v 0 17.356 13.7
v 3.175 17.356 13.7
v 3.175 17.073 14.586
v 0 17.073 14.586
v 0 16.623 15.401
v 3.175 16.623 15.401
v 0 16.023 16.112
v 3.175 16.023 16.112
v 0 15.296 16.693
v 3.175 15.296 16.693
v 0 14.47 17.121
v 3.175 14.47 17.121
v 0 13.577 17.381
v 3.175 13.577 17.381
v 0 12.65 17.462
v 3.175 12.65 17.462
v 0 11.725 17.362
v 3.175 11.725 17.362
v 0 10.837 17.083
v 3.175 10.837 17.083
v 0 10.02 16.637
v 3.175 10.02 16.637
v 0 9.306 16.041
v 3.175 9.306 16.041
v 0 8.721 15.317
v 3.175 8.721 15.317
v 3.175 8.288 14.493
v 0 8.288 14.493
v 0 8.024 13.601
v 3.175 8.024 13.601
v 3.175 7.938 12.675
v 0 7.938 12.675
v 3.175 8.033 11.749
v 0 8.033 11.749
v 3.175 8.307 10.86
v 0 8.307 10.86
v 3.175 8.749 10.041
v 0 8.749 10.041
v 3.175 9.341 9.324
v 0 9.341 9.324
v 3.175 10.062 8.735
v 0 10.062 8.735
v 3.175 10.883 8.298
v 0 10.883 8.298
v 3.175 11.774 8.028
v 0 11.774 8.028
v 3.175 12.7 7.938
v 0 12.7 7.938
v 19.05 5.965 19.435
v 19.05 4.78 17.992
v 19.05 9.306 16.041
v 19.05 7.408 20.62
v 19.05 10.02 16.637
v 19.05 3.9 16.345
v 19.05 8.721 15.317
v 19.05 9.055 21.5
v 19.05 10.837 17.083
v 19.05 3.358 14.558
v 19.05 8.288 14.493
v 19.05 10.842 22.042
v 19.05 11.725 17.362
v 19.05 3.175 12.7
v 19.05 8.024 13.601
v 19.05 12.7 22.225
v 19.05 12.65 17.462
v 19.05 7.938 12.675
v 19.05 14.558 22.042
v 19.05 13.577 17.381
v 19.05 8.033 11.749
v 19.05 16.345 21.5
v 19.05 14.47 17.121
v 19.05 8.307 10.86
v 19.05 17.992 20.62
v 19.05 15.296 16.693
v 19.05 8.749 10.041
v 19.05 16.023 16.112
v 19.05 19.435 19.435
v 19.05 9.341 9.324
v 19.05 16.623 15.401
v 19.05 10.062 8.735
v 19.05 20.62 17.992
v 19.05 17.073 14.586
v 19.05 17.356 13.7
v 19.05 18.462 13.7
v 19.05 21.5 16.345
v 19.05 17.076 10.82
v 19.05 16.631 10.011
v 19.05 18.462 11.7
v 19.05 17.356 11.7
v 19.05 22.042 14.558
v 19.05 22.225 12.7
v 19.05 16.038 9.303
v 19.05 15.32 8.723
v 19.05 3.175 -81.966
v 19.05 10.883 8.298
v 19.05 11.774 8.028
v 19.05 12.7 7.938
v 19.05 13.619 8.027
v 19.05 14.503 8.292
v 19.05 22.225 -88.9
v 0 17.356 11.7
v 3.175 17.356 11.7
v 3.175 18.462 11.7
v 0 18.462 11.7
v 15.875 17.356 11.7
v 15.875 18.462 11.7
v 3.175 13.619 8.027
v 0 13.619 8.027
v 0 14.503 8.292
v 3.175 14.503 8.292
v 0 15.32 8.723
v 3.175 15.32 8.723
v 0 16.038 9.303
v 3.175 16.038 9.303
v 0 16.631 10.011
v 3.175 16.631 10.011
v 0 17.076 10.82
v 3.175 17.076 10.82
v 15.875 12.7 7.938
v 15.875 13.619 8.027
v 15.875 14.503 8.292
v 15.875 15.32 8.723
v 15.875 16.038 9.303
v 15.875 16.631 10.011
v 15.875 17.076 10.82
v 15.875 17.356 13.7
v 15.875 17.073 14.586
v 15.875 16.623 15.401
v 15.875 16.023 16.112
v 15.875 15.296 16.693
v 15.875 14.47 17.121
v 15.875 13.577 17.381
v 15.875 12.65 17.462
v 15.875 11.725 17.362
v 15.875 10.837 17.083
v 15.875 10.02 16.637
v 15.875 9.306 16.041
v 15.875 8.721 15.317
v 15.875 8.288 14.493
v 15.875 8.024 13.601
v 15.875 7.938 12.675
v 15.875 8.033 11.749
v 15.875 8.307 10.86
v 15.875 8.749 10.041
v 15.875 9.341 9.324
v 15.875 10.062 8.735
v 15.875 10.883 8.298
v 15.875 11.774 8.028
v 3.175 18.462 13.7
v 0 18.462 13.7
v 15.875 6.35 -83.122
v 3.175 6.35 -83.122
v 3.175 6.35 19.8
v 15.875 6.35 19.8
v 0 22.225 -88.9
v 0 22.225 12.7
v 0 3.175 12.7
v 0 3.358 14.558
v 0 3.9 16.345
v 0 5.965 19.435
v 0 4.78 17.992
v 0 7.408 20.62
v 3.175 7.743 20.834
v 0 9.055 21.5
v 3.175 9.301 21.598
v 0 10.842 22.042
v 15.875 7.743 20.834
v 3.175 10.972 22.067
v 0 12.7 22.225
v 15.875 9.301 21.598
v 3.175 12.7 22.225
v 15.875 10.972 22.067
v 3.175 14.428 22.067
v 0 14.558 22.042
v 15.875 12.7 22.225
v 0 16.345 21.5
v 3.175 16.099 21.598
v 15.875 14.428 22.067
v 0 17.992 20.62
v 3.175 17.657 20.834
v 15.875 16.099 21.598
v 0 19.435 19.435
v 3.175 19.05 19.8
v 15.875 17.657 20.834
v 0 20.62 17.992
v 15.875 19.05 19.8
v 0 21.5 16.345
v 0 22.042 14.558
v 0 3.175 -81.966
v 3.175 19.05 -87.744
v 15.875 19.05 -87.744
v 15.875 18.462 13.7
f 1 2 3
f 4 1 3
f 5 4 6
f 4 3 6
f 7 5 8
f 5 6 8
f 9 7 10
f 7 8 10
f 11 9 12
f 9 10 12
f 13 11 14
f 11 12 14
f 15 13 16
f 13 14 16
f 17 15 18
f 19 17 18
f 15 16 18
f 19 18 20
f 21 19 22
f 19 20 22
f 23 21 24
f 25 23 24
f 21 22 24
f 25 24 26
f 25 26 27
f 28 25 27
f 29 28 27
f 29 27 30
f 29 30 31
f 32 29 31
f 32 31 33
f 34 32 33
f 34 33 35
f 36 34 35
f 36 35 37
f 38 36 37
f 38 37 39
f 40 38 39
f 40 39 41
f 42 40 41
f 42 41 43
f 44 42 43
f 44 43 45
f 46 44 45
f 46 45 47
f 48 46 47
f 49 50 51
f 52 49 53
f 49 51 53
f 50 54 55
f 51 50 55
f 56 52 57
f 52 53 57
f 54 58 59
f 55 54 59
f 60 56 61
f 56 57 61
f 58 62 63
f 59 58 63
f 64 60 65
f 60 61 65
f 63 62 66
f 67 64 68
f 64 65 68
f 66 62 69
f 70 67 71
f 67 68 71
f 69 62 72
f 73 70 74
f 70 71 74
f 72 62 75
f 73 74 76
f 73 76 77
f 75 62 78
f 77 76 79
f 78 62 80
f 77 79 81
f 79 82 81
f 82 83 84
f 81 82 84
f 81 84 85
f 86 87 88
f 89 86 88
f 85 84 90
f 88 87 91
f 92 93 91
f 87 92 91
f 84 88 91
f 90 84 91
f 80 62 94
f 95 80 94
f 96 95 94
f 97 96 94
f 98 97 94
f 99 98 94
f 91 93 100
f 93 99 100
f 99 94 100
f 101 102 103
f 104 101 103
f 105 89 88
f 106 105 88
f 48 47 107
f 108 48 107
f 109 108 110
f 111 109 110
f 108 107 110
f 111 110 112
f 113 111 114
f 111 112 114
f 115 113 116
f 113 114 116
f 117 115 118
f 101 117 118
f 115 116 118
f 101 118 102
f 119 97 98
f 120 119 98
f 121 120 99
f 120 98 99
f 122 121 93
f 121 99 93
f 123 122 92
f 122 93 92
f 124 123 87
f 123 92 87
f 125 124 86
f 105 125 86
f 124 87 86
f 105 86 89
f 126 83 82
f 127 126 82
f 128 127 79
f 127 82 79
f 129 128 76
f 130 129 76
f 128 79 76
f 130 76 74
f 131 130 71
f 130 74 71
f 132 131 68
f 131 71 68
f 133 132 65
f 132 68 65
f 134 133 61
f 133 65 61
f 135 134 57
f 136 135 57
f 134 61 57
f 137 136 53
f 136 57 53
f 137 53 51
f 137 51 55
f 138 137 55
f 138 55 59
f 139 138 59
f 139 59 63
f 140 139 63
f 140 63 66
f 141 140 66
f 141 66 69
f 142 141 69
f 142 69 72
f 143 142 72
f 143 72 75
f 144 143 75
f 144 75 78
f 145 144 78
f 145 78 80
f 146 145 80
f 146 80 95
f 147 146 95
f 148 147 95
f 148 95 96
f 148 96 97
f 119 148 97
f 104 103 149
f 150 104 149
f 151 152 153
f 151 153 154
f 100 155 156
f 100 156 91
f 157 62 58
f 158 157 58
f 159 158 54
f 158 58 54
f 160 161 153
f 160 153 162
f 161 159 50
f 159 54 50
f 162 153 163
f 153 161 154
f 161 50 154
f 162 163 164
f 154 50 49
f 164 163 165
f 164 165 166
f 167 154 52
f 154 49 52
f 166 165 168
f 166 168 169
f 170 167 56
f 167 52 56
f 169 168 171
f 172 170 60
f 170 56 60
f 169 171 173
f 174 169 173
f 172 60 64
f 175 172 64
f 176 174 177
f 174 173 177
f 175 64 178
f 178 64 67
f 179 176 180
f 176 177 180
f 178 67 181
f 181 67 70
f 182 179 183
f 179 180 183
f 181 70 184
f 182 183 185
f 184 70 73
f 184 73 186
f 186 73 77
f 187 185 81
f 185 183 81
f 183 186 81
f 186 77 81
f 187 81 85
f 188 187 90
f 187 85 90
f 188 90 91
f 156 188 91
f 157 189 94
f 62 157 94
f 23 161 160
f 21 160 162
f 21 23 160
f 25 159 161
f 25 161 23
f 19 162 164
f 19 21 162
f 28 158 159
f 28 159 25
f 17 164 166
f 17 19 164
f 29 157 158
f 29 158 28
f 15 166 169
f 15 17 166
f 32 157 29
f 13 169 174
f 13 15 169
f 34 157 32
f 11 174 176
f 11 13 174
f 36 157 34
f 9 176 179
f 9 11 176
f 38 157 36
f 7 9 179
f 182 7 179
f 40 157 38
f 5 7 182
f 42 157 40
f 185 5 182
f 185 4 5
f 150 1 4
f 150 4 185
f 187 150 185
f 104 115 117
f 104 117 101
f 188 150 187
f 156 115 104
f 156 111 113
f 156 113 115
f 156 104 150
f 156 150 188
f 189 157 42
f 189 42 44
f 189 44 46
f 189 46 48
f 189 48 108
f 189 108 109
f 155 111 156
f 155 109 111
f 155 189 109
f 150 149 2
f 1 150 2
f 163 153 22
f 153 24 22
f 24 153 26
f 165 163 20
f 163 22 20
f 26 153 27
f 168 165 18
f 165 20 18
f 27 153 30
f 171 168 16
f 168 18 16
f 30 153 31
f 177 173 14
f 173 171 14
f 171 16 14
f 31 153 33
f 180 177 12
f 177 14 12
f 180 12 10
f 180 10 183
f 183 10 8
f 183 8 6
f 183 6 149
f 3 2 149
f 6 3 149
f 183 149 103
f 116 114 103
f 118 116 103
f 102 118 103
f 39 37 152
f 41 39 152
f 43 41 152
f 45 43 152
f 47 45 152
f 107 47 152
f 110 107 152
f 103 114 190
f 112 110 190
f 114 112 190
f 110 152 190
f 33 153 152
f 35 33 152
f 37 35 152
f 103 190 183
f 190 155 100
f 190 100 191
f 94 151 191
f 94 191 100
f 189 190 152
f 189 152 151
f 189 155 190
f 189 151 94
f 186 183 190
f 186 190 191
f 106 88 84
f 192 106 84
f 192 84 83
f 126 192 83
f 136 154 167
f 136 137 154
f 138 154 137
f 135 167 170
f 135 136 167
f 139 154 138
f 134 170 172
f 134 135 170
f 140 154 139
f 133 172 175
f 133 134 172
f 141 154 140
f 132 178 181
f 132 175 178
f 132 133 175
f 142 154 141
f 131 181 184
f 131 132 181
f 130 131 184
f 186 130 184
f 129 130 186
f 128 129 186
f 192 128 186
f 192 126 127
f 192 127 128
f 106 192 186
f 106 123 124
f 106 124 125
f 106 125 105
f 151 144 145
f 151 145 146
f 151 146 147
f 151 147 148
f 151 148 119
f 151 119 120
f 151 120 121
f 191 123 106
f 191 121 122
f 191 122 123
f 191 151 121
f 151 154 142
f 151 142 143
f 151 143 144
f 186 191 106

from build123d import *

# Parameters (mm, degrees)
BOSS_EXTRUDE1_DEPTH = 19.05
SKETCH2_W           = 12.7
SKETCH2_H           = 12.7
CUT_EXTRUDE3_DEPTH  = 106.732743864
SKETCH3_W           = 19.05
SKETCH3_H           = 19.05
SKETCH3_W_2         = 12.7
SKETCH3_H_2         = 12.7
BOSS_EXTRUDE2_DEPTH = 12.7
CUT_EXTRUDE5_DEPTH  = 19.05


with BuildPart() as part:
    # Sketch1 → Boss-Extrude1 (new body)
    with BuildSketch(Plane(origin=(0, 0, 0), x_dir=(0, 0, -1), z_dir=(1, 0, 0))):
        Polygon((-12.7, 22.225), (81.966367037, 22.225), (88.9, 22.225), (81.966367037, 3.175), (-12.7, 3.175), align=None)
    extrude(amount=BOSS_EXTRUDE1_DEPTH)

    # Sketch2 → Cut-Extrude3 (cut, through all)
    with BuildSketch(Plane.XY.offset(12.7)):
        with Locations((9.525, 12.7)):
            Rectangle(SKETCH2_W, SKETCH2_H)
    extrude(amount=-CUT_EXTRUDE3_DEPTH, mode=Mode.SUBTRACT)

    # Sketch3 → Boss-Extrude2 (add)
    with BuildSketch(Plane.XY.offset(12.7)):
        with Locations((9.525, 12.7)):
            Rectangle(SKETCH3_W, SKETCH3_H)
        with Locations((9.525, 12.7)):
            Rectangle(SKETCH3_W_2, SKETCH3_H_2, mode=Mode.SUBTRACT)
    extrude(amount=BOSS_EXTRUDE2_DEPTH)

    # Sketch4 → Cut-Extrude5 (cut)
    with BuildSketch(Plane(origin=(19.05, 0, 0), x_dir=(0, 0, -1), z_dir=(1, 0, 0))):
        with BuildLine():
            Line((-11.7, 17.356329697), (-11.7, 16.4625))
            Line((-11.7, 16.4625), (-13.7, 16.4625))
            Line((-13.7, 16.4625), (-13.7, 17.356329697))
            ThreePointArc((-13.7, 17.356329697), (-15.693234559, 8.995684527), (-7.9375, 12.7))
            ThreePointArc((-7.9375, 12.7), (-8.995684527, 15.693234559), (-11.7, 17.356329697))
        make_face()
        with BuildLine():
            Line((-13.7, 16.4625), (-11.7, 16.4625))
            Line((-11.7, 16.4625), (-11.7, 17.356329697))
            ThreePointArc((-11.7, 17.356329697), (-12.7, 17.4625), (-13.7, 17.356329697))
            Line((-13.7, 17.356329697), (-13.7, 16.4625))
        make_face()
        with BuildLine():
            ThreePointArc((-13.7, 17.356329697), (-12.7, 17.4625), (-11.7, 17.356329697))
            Line((-11.7, 17.356329697), (-11.7, 18.4625))
            Line((-11.7, 18.4625), (-13.7, 18.4625))
            Line((-13.7, 18.4625), (-13.7, 17.356329697))
        make_face()
        with BuildLine():
            Line((-25.4, 3.175), (-12.7, 3.175))
            ThreePointArc((-12.7, 3.175), (-22.225, 12.7), (-12.7, 22.225))
            Line((-12.7, 22.225), (-25.4, 22.225))
            Line((-25.4, 22.225), (-25.4, 3.175))
        make_face()
    extrude(amount=-CUT_EXTRUDE5_DEPTH, mode=Mode.SUBTRACT)


solid = part.part
